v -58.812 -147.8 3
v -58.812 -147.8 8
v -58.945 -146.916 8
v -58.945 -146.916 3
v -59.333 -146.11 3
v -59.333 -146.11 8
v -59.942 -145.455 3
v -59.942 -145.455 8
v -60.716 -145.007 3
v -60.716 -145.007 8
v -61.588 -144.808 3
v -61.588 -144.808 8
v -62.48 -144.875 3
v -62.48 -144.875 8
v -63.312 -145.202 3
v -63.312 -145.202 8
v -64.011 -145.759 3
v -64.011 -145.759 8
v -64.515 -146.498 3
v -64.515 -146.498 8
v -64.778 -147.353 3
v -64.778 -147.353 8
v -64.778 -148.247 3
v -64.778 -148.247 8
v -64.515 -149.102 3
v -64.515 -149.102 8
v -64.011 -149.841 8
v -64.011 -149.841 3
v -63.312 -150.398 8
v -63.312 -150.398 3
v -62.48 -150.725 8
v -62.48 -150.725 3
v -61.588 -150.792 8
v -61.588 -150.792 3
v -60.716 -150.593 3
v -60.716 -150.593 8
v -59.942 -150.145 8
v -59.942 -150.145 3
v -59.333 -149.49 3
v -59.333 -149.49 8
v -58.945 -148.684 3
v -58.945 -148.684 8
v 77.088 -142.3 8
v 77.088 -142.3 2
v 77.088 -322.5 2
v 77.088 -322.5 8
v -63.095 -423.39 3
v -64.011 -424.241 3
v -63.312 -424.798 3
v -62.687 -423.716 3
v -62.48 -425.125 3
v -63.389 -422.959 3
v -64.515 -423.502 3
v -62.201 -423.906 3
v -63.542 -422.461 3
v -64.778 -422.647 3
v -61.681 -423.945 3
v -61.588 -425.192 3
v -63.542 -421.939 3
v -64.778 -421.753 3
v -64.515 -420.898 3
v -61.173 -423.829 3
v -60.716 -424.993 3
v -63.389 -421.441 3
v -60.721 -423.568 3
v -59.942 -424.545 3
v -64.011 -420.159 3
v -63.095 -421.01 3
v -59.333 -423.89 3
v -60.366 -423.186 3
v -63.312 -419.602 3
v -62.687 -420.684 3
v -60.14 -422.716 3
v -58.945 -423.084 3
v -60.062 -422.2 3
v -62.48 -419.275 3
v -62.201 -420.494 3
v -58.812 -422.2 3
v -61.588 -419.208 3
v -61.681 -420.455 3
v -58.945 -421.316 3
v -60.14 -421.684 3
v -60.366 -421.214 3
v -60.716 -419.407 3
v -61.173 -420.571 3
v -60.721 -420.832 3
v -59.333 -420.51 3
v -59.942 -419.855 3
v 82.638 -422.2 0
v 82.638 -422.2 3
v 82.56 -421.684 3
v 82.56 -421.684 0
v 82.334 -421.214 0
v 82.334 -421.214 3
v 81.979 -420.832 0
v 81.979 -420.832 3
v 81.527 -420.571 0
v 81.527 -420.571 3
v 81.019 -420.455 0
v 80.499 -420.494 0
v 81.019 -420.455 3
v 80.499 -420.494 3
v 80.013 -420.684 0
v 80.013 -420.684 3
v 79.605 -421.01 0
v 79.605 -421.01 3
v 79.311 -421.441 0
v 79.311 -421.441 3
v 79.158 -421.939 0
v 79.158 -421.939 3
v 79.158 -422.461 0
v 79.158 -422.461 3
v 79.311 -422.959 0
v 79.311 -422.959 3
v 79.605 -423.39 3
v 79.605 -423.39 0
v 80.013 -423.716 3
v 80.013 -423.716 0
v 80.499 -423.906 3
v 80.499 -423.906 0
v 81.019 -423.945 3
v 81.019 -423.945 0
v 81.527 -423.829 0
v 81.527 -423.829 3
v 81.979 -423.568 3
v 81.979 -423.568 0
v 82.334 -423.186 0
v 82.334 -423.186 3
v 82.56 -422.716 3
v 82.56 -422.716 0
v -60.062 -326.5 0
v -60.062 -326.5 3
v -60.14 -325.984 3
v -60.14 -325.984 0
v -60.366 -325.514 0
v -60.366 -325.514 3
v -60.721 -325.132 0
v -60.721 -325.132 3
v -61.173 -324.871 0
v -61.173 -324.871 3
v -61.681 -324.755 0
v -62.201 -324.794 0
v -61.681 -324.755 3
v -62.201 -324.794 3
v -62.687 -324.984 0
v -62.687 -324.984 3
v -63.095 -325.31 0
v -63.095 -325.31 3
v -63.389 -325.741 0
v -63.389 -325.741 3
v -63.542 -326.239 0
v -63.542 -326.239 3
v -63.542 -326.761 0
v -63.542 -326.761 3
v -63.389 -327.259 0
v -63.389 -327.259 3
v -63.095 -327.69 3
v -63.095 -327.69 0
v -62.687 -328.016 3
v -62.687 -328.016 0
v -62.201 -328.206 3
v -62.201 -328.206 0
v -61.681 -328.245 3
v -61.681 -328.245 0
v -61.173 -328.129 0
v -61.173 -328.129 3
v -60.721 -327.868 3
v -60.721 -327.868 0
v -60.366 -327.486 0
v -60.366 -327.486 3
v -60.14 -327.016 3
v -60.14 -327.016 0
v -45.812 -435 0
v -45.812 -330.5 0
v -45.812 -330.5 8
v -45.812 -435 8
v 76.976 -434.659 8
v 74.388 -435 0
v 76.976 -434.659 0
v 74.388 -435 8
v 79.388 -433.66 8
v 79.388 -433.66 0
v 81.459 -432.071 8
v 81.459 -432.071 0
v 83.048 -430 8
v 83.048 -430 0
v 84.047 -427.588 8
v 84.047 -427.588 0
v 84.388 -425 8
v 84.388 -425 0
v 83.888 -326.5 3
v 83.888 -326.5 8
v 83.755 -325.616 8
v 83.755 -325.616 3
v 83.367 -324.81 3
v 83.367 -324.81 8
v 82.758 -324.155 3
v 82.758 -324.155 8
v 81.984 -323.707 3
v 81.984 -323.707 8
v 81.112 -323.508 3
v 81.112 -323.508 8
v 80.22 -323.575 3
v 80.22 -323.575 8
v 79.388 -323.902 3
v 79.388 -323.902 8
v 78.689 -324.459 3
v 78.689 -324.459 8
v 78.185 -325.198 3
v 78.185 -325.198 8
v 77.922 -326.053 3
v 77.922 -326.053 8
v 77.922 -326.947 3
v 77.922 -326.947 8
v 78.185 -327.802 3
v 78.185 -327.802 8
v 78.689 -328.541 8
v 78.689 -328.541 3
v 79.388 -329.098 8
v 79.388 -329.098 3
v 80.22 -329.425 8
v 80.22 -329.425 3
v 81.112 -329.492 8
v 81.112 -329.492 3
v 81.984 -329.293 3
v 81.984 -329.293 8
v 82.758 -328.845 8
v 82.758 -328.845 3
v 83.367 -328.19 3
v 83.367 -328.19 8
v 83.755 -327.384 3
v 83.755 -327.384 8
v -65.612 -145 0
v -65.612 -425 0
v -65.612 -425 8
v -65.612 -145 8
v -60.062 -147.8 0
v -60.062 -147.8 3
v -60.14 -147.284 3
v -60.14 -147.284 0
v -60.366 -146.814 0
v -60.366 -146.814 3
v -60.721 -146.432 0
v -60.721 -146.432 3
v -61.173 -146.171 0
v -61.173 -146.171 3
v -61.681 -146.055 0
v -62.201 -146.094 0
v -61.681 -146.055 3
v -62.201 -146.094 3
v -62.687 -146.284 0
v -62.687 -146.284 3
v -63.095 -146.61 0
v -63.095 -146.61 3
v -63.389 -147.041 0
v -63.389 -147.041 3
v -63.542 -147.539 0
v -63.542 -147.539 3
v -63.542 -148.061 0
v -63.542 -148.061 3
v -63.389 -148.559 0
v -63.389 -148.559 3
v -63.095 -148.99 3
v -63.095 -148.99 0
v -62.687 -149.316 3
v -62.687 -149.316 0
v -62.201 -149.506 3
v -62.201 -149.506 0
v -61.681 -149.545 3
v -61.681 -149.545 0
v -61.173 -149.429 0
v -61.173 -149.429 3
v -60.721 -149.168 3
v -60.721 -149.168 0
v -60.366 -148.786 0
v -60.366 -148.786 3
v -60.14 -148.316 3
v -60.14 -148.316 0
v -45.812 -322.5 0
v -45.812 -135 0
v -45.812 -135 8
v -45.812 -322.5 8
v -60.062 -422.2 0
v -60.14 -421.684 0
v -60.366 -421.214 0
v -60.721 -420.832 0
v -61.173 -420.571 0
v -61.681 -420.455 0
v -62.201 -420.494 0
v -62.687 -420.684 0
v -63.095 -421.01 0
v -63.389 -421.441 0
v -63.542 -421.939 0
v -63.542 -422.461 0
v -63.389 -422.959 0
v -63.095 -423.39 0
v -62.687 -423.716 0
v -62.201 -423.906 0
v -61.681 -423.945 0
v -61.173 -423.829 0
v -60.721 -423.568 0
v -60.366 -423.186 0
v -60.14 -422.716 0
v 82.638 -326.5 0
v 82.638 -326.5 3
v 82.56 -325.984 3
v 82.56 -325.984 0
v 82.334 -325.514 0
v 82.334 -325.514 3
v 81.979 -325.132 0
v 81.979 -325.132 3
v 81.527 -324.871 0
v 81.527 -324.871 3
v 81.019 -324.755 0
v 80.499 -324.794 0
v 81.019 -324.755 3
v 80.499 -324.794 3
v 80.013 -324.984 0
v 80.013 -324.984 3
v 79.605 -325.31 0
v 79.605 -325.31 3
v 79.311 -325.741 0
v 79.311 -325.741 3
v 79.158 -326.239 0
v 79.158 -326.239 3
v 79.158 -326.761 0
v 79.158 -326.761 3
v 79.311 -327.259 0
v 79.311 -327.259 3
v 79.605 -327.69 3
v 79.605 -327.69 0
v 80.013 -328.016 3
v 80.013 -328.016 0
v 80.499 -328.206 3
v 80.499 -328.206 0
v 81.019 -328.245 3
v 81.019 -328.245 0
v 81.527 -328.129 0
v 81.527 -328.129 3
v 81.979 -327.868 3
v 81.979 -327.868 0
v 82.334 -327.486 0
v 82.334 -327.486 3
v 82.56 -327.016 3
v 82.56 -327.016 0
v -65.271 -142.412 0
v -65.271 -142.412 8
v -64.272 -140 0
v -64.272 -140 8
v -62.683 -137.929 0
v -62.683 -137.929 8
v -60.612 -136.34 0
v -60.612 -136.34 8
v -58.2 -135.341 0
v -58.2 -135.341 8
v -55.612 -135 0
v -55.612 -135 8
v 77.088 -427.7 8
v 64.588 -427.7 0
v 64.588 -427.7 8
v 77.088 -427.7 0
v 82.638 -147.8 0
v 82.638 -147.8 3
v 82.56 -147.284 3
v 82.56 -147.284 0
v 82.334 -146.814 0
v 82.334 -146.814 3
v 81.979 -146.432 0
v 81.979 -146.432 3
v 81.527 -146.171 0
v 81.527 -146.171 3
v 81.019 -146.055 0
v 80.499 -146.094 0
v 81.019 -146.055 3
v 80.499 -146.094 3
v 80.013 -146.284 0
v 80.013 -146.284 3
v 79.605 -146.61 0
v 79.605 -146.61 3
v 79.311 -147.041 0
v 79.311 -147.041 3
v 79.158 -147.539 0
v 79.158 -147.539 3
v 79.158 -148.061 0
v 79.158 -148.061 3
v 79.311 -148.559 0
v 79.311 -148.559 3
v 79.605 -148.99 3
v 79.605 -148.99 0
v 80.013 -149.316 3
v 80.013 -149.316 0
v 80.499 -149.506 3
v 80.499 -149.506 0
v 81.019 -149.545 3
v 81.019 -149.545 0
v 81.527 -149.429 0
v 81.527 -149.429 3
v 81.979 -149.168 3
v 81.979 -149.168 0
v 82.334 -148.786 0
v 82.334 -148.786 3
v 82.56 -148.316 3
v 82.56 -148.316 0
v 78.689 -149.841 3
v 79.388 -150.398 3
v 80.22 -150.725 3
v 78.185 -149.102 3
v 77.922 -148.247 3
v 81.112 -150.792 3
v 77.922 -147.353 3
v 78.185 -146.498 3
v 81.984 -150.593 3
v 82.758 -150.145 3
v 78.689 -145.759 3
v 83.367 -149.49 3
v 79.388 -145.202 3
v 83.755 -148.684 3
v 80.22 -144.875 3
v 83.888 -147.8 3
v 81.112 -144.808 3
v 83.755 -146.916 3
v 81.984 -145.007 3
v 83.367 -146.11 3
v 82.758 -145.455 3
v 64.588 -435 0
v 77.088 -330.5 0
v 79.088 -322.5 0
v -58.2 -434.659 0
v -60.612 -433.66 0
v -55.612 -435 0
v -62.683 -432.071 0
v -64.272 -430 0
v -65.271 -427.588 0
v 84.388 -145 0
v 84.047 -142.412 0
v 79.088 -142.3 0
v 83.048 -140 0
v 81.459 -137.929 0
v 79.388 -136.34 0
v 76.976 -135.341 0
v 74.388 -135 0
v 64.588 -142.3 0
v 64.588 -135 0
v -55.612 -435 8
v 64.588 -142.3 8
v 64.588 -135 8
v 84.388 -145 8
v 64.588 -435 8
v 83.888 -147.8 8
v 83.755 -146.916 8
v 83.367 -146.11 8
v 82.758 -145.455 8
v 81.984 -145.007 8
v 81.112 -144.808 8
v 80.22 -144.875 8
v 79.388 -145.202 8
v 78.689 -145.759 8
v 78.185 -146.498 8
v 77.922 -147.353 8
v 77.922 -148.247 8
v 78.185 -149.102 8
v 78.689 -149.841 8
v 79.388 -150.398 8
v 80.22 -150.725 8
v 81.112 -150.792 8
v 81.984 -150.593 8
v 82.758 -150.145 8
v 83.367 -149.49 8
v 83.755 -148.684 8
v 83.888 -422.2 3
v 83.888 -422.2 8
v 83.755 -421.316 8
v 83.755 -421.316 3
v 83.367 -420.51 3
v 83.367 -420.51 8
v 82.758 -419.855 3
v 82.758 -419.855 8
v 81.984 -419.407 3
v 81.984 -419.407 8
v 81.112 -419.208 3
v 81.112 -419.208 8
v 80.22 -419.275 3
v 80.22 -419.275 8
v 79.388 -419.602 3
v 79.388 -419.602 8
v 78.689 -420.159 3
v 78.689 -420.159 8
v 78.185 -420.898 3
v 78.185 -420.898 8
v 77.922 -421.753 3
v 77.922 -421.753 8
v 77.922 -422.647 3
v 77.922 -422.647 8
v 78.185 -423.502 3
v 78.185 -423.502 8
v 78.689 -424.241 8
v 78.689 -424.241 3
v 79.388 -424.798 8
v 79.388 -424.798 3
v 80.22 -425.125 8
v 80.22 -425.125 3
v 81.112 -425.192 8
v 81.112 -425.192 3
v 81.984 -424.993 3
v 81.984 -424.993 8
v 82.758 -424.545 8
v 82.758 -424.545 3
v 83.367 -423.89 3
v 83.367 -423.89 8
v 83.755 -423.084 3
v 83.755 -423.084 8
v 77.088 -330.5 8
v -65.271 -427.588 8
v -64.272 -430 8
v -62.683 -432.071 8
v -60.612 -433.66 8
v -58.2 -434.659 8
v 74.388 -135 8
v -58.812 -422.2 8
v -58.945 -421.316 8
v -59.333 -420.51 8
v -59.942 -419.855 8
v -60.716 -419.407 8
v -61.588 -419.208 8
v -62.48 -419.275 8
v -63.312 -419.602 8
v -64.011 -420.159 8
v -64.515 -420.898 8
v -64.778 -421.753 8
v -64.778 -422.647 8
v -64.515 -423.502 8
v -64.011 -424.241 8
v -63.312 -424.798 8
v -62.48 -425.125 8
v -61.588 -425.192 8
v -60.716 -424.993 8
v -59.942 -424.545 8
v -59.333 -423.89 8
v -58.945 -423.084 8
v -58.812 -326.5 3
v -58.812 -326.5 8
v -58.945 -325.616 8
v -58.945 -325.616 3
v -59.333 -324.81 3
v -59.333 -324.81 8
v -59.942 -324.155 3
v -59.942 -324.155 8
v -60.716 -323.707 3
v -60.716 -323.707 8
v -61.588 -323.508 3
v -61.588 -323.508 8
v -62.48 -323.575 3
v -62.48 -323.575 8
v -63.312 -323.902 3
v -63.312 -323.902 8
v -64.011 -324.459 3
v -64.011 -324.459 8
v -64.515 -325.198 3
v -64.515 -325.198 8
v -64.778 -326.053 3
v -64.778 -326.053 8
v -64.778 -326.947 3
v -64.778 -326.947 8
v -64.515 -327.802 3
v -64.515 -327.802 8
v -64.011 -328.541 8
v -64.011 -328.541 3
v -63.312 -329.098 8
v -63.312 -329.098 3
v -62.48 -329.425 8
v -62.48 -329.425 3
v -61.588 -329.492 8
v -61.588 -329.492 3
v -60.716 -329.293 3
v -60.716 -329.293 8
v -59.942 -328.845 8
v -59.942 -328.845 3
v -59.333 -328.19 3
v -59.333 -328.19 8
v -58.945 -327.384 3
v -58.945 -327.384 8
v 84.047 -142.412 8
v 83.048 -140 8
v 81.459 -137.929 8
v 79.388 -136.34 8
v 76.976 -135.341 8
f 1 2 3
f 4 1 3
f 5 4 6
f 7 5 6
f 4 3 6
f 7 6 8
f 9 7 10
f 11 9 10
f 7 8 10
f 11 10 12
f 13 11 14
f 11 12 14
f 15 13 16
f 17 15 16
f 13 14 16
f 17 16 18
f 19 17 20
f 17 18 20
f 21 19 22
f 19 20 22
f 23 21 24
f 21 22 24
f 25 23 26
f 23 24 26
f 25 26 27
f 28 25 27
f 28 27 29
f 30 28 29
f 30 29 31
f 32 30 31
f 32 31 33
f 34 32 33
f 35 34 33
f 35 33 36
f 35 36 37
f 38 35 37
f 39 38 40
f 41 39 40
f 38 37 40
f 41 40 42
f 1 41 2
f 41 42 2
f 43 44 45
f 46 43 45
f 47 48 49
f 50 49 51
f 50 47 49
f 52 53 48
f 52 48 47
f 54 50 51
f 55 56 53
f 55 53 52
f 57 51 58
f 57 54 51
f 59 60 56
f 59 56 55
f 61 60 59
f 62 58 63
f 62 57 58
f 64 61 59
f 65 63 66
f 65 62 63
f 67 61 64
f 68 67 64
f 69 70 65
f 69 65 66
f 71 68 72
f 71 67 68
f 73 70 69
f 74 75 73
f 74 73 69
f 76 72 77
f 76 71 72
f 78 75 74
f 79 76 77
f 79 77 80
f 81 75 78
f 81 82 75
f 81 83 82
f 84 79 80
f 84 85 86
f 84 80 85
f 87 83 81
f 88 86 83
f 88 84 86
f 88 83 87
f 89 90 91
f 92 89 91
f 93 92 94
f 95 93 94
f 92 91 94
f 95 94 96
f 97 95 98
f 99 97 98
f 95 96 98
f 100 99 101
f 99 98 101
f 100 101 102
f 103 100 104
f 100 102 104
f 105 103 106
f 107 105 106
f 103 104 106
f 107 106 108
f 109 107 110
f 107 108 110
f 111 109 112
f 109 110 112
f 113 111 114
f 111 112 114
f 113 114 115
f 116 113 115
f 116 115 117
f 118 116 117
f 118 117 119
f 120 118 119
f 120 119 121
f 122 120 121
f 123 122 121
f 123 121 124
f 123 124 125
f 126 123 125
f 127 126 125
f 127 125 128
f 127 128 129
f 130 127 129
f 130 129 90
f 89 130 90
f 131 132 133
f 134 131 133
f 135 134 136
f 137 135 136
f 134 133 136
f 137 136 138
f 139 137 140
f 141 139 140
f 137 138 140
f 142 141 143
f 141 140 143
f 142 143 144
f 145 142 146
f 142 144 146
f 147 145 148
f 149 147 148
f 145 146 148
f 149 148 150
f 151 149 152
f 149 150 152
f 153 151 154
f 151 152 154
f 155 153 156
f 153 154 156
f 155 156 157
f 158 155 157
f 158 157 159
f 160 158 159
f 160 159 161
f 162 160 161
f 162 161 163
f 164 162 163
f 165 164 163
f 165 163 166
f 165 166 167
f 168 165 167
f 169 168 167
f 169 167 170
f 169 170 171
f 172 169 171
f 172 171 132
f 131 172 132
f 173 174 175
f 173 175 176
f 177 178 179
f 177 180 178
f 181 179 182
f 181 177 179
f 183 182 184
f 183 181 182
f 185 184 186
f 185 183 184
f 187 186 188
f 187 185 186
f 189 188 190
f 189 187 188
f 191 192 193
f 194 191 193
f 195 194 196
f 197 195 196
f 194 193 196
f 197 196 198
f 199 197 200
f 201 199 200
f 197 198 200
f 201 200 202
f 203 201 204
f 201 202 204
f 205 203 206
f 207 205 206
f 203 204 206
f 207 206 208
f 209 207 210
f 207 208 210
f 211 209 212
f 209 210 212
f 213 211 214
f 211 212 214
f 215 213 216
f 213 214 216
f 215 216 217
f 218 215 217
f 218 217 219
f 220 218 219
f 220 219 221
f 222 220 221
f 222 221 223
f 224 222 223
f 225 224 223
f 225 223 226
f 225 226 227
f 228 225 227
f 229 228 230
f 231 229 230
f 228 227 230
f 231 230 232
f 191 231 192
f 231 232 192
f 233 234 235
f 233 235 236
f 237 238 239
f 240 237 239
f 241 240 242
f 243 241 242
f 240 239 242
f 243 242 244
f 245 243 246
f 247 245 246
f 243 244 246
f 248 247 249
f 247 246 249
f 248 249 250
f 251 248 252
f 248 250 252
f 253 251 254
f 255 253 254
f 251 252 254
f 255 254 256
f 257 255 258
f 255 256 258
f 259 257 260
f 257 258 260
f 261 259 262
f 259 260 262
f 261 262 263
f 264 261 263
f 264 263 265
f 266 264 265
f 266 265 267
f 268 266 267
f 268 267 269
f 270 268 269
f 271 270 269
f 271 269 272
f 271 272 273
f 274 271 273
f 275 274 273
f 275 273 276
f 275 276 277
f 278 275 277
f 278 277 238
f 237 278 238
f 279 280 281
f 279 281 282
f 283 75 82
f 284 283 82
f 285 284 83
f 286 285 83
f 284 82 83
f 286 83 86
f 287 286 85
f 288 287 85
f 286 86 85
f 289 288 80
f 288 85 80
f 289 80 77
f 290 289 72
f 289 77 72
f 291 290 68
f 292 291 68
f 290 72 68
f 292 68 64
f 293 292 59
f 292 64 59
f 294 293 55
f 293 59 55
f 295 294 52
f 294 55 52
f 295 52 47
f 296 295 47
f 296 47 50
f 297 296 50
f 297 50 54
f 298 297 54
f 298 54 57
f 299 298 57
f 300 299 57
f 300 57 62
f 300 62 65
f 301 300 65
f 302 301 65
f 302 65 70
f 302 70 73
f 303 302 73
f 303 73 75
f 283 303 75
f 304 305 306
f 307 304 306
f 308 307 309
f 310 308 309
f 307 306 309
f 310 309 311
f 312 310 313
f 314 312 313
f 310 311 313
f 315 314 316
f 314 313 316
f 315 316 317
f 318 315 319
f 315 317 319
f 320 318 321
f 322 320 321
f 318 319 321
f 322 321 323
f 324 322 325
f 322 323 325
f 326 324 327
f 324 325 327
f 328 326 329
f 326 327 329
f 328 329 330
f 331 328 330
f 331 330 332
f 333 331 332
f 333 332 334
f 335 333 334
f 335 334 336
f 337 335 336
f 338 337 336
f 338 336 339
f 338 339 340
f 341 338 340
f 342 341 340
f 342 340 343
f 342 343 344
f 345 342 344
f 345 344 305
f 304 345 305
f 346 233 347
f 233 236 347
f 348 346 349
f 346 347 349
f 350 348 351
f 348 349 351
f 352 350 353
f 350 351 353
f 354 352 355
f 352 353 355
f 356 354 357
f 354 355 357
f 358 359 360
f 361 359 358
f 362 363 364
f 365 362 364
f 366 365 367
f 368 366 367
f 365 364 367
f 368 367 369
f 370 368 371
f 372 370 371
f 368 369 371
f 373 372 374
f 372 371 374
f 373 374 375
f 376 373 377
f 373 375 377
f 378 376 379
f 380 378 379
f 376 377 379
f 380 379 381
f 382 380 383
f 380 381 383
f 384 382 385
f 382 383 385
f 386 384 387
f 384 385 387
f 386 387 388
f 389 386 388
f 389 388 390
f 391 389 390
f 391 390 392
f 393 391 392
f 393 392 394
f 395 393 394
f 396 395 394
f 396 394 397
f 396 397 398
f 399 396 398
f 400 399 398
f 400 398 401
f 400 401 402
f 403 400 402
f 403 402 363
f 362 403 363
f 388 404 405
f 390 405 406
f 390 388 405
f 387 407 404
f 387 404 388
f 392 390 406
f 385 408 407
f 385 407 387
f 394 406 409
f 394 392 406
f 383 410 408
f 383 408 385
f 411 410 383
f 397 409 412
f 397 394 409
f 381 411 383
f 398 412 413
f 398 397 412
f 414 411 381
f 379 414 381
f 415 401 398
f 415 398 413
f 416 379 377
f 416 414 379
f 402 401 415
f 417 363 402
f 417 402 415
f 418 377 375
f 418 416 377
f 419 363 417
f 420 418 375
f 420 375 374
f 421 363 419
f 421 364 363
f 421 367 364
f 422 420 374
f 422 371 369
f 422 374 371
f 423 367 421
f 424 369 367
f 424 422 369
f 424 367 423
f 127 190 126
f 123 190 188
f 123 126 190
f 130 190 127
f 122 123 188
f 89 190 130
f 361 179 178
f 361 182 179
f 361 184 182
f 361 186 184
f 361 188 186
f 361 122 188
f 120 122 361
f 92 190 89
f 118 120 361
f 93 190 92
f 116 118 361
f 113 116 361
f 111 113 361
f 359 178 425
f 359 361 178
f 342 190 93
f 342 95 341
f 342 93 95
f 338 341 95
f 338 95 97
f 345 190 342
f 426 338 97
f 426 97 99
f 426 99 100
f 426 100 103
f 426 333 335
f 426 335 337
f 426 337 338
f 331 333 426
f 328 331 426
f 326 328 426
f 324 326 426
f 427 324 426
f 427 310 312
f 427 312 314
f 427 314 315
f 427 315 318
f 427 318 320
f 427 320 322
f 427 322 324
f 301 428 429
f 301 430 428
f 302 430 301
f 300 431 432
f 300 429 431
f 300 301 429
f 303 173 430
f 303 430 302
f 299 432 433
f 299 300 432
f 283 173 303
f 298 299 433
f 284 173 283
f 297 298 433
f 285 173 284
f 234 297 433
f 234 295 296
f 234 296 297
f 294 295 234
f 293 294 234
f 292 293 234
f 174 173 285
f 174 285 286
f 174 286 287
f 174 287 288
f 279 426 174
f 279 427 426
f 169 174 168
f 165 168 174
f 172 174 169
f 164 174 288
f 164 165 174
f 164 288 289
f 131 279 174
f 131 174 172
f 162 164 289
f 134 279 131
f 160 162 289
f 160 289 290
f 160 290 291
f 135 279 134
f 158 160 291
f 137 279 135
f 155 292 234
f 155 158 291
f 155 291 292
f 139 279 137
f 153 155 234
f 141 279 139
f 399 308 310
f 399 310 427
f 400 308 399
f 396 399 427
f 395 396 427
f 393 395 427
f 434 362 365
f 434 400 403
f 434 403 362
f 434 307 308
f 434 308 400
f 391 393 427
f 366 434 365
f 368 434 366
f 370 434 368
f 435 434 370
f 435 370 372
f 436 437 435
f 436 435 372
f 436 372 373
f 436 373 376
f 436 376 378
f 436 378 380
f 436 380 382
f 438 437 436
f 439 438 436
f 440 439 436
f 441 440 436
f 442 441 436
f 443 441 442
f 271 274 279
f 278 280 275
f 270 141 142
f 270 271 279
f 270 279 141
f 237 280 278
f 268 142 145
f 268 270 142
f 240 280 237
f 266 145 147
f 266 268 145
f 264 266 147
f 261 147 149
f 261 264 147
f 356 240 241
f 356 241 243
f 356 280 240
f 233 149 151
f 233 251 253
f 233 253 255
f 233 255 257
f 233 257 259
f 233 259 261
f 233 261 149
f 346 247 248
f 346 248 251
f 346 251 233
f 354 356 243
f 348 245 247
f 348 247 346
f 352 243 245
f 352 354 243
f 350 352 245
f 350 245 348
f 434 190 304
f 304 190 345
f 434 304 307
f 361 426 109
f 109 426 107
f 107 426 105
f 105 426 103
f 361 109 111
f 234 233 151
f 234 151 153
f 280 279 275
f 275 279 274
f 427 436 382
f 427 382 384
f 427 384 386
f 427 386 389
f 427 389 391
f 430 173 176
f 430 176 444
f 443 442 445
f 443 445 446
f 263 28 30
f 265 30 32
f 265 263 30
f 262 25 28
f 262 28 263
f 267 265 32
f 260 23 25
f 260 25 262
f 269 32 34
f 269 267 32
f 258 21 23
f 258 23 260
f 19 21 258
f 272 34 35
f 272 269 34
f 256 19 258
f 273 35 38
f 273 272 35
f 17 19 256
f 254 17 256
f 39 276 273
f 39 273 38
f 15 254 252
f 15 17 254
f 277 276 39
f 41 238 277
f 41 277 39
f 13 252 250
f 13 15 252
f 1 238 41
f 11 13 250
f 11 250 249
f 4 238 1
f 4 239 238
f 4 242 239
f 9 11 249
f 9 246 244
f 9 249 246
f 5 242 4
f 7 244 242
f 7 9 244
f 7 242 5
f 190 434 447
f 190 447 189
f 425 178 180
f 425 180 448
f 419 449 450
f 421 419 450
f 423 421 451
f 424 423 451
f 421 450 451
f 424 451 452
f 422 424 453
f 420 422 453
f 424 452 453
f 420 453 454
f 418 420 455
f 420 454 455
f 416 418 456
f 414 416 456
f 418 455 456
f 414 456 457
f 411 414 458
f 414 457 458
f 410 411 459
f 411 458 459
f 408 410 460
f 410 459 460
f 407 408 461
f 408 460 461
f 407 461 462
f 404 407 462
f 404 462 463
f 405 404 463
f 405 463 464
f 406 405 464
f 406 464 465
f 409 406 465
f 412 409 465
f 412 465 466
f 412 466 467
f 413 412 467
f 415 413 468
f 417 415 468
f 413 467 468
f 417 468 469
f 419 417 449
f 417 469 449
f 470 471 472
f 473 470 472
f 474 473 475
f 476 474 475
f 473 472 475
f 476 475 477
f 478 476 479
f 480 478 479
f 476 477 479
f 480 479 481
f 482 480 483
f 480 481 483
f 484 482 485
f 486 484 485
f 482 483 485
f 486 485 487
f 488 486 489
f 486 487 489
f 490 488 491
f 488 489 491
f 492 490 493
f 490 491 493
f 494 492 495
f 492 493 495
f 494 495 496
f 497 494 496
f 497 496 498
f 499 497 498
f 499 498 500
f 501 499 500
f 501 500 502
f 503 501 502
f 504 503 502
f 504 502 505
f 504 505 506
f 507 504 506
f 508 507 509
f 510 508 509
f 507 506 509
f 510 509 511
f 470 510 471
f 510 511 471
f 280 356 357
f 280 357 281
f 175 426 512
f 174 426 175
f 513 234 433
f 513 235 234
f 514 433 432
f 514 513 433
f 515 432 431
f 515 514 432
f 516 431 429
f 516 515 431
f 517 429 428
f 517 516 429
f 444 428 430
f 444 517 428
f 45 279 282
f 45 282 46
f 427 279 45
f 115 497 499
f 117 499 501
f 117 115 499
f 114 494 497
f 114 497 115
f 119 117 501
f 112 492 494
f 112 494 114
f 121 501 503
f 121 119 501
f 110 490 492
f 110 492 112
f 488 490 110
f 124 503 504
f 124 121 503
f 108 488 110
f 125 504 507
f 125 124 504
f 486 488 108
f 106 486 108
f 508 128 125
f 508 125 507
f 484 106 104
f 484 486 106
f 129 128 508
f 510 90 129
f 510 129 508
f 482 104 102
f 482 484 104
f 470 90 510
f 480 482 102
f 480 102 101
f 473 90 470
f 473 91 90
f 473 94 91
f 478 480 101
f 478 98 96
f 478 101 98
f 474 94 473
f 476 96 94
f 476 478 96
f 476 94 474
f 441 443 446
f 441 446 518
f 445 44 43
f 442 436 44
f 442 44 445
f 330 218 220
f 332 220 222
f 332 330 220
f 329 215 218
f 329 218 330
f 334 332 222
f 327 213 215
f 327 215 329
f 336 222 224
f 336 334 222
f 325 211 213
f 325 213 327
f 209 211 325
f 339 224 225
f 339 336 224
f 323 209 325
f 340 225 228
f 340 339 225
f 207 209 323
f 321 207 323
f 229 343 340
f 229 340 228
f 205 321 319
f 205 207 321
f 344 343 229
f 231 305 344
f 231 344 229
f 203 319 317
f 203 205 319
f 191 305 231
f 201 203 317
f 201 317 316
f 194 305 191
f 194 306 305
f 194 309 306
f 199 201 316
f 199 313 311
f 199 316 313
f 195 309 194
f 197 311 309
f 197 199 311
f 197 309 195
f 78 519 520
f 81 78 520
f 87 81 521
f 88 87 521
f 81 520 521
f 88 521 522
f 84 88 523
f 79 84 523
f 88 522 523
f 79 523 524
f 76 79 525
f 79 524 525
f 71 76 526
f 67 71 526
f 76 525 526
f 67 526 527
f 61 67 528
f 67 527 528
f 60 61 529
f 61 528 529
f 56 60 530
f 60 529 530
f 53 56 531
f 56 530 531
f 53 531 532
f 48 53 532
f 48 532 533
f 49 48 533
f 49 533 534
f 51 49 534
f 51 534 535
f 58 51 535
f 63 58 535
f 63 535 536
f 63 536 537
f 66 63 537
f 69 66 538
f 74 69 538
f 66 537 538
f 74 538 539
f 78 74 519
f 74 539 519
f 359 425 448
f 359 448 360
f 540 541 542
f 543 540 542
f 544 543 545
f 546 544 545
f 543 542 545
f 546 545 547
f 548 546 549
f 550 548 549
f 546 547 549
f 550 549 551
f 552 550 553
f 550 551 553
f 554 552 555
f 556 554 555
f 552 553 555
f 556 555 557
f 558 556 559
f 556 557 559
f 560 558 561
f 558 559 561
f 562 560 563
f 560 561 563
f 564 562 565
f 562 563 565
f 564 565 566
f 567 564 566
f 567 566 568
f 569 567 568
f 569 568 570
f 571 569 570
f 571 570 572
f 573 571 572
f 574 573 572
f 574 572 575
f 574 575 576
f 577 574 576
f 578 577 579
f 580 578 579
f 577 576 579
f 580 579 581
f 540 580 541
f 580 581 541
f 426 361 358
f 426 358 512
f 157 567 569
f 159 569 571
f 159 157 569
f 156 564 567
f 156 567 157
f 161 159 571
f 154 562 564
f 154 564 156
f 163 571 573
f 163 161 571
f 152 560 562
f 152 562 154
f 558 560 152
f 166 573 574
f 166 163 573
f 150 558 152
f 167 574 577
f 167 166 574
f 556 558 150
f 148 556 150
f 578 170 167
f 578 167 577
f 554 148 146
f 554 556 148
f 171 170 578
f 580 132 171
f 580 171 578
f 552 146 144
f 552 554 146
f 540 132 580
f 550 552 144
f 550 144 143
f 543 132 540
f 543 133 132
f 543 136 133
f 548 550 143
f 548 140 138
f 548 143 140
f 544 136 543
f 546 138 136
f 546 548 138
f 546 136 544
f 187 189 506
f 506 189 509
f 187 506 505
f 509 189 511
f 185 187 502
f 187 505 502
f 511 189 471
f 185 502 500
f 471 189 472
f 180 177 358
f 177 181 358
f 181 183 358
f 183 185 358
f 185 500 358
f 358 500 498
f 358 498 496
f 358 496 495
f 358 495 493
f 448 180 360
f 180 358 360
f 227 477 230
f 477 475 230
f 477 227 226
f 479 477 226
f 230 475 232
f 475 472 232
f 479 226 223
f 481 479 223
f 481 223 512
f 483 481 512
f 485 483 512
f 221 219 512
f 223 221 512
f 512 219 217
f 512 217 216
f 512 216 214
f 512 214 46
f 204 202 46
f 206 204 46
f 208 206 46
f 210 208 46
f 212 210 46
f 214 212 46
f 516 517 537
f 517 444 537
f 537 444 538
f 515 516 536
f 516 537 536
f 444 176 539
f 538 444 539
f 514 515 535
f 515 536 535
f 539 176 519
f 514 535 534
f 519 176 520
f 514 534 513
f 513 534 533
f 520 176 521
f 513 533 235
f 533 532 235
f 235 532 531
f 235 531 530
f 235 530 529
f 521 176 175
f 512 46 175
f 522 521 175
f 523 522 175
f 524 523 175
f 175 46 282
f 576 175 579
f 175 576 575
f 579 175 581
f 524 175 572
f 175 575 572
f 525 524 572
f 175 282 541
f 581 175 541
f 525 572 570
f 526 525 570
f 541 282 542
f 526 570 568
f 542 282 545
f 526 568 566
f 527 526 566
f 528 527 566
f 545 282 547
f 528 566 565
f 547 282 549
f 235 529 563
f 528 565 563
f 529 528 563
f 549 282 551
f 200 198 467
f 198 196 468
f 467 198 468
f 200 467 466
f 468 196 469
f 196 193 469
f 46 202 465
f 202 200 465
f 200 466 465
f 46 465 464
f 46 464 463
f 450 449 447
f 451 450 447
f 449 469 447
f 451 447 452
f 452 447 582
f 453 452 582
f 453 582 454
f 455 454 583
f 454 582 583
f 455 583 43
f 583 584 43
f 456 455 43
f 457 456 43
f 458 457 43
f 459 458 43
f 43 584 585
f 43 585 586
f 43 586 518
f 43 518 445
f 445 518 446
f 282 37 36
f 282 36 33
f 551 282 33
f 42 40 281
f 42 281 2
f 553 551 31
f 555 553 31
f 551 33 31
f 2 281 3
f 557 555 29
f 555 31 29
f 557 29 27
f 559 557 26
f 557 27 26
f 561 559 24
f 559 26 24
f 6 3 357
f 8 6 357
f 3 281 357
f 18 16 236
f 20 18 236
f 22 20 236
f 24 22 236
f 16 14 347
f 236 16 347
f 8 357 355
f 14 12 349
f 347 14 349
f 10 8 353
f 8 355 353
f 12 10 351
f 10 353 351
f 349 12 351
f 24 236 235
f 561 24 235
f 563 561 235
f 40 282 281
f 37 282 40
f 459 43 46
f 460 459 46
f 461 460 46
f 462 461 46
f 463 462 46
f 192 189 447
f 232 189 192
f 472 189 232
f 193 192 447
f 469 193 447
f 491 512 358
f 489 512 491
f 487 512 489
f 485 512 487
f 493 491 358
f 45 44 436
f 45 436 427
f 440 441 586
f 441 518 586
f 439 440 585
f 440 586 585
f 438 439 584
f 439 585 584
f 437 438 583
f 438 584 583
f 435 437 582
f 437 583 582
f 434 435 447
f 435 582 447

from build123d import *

# Parameters (mm, degrees)
LID_DEPTH             = 8
SKETCH2_R             = 3
INSETSCREWHOLES_DEPTH = 5
SKETCH3_R             = 1.75
SCREWHOLES_DEPTH      = 444.138052318
FILLET2_R             = 10
CHAMFER1_SIZE         = 2


with BuildPart() as part:
    # Sketch1 → Lid (new body)
    with BuildSketch(Plane.XY):
        Polygon((-65.612006704, -435), (-65.612006704, -135), (-45.812006704, -135), (-45.812006704, -322.5), (77.087993296, -322.5), (77.087993296, -154.8), (77.087993296, -142.3), (64.587993296, -142.3), (64.587993296, -135), (84.387993296, -135), (84.387993296, -435), (64.587993296, -435), (64.587993296, -427.7), (77.087993296, -427.7), (77.087993296, -330.5), (-45.812006704, -330.5), (-45.812006704, -435), align=None)
    extrude(amount=LID_DEPTH)

    # Sketch2 → InsetScrewHoles (cut)
    with BuildSketch(Plane.XY.offset(8)):
        with Locations((80.887993296, -147.8)):
            Circle(SKETCH2_R)
        with Locations((-61.812006704, -147.8)):
            Circle(SKETCH2_R)
        with Locations((-61.812006704, -326.5)):
            Circle(SKETCH2_R)
        with Locations((80.887993296, -326.5)):
            Circle(SKETCH2_R)
        with Locations((80.887993296, -422.2)):
            Circle(SKETCH2_R)
        with Locations((-61.812006704, -422.2)):
            Circle(SKETCH2_R)
    extrude(amount=-INSETSCREWHOLES_DEPTH, mode=Mode.SUBTRACT)

    # Sketch3 → ScrewHoles (cut, through all)
    with BuildSketch(Plane.XY.offset(3)):
        with Locations((-61.812006704, -147.8)):
            Circle(SKETCH3_R)
        with Locations((80.887993296, -147.8)):
            Circle(SKETCH3_R)
        with Locations((80.887993296, -326.5)):
            Circle(SKETCH3_R)
        with Locations((-61.812006704, -326.5)):
            Circle(SKETCH3_R)
        with Locations((80.887993296, -422.2)):
            Circle(SKETCH3_R)
        with Locations((-61.812006704, -422.2)):
            Circle(SKETCH3_R)
    extrude(amount=-SCREWHOLES_DEPTH, mode=Mode.SUBTRACT)

    # Fillet2
    fillet2_edges = [part.edges().sort_by_distance(p)[0] for p in [
        (-65.612006704, -435, 4),
        (-65.612006704, -135, 4),
        (84.387993296, -135, 4),
        (84.387993296, -435, 4),
    ]]
    fillet(fillet2_edges, radius=FILLET2_R)

    # Chamfer1
    chamfer1_edges = [part.edges().sort_by_distance(p)[0] for p in [
        (77.087993296, -232.4, 0),
    ]]
    chamfer(chamfer1_edges, length=CHAMFER1_SIZE)


solid = part.part
